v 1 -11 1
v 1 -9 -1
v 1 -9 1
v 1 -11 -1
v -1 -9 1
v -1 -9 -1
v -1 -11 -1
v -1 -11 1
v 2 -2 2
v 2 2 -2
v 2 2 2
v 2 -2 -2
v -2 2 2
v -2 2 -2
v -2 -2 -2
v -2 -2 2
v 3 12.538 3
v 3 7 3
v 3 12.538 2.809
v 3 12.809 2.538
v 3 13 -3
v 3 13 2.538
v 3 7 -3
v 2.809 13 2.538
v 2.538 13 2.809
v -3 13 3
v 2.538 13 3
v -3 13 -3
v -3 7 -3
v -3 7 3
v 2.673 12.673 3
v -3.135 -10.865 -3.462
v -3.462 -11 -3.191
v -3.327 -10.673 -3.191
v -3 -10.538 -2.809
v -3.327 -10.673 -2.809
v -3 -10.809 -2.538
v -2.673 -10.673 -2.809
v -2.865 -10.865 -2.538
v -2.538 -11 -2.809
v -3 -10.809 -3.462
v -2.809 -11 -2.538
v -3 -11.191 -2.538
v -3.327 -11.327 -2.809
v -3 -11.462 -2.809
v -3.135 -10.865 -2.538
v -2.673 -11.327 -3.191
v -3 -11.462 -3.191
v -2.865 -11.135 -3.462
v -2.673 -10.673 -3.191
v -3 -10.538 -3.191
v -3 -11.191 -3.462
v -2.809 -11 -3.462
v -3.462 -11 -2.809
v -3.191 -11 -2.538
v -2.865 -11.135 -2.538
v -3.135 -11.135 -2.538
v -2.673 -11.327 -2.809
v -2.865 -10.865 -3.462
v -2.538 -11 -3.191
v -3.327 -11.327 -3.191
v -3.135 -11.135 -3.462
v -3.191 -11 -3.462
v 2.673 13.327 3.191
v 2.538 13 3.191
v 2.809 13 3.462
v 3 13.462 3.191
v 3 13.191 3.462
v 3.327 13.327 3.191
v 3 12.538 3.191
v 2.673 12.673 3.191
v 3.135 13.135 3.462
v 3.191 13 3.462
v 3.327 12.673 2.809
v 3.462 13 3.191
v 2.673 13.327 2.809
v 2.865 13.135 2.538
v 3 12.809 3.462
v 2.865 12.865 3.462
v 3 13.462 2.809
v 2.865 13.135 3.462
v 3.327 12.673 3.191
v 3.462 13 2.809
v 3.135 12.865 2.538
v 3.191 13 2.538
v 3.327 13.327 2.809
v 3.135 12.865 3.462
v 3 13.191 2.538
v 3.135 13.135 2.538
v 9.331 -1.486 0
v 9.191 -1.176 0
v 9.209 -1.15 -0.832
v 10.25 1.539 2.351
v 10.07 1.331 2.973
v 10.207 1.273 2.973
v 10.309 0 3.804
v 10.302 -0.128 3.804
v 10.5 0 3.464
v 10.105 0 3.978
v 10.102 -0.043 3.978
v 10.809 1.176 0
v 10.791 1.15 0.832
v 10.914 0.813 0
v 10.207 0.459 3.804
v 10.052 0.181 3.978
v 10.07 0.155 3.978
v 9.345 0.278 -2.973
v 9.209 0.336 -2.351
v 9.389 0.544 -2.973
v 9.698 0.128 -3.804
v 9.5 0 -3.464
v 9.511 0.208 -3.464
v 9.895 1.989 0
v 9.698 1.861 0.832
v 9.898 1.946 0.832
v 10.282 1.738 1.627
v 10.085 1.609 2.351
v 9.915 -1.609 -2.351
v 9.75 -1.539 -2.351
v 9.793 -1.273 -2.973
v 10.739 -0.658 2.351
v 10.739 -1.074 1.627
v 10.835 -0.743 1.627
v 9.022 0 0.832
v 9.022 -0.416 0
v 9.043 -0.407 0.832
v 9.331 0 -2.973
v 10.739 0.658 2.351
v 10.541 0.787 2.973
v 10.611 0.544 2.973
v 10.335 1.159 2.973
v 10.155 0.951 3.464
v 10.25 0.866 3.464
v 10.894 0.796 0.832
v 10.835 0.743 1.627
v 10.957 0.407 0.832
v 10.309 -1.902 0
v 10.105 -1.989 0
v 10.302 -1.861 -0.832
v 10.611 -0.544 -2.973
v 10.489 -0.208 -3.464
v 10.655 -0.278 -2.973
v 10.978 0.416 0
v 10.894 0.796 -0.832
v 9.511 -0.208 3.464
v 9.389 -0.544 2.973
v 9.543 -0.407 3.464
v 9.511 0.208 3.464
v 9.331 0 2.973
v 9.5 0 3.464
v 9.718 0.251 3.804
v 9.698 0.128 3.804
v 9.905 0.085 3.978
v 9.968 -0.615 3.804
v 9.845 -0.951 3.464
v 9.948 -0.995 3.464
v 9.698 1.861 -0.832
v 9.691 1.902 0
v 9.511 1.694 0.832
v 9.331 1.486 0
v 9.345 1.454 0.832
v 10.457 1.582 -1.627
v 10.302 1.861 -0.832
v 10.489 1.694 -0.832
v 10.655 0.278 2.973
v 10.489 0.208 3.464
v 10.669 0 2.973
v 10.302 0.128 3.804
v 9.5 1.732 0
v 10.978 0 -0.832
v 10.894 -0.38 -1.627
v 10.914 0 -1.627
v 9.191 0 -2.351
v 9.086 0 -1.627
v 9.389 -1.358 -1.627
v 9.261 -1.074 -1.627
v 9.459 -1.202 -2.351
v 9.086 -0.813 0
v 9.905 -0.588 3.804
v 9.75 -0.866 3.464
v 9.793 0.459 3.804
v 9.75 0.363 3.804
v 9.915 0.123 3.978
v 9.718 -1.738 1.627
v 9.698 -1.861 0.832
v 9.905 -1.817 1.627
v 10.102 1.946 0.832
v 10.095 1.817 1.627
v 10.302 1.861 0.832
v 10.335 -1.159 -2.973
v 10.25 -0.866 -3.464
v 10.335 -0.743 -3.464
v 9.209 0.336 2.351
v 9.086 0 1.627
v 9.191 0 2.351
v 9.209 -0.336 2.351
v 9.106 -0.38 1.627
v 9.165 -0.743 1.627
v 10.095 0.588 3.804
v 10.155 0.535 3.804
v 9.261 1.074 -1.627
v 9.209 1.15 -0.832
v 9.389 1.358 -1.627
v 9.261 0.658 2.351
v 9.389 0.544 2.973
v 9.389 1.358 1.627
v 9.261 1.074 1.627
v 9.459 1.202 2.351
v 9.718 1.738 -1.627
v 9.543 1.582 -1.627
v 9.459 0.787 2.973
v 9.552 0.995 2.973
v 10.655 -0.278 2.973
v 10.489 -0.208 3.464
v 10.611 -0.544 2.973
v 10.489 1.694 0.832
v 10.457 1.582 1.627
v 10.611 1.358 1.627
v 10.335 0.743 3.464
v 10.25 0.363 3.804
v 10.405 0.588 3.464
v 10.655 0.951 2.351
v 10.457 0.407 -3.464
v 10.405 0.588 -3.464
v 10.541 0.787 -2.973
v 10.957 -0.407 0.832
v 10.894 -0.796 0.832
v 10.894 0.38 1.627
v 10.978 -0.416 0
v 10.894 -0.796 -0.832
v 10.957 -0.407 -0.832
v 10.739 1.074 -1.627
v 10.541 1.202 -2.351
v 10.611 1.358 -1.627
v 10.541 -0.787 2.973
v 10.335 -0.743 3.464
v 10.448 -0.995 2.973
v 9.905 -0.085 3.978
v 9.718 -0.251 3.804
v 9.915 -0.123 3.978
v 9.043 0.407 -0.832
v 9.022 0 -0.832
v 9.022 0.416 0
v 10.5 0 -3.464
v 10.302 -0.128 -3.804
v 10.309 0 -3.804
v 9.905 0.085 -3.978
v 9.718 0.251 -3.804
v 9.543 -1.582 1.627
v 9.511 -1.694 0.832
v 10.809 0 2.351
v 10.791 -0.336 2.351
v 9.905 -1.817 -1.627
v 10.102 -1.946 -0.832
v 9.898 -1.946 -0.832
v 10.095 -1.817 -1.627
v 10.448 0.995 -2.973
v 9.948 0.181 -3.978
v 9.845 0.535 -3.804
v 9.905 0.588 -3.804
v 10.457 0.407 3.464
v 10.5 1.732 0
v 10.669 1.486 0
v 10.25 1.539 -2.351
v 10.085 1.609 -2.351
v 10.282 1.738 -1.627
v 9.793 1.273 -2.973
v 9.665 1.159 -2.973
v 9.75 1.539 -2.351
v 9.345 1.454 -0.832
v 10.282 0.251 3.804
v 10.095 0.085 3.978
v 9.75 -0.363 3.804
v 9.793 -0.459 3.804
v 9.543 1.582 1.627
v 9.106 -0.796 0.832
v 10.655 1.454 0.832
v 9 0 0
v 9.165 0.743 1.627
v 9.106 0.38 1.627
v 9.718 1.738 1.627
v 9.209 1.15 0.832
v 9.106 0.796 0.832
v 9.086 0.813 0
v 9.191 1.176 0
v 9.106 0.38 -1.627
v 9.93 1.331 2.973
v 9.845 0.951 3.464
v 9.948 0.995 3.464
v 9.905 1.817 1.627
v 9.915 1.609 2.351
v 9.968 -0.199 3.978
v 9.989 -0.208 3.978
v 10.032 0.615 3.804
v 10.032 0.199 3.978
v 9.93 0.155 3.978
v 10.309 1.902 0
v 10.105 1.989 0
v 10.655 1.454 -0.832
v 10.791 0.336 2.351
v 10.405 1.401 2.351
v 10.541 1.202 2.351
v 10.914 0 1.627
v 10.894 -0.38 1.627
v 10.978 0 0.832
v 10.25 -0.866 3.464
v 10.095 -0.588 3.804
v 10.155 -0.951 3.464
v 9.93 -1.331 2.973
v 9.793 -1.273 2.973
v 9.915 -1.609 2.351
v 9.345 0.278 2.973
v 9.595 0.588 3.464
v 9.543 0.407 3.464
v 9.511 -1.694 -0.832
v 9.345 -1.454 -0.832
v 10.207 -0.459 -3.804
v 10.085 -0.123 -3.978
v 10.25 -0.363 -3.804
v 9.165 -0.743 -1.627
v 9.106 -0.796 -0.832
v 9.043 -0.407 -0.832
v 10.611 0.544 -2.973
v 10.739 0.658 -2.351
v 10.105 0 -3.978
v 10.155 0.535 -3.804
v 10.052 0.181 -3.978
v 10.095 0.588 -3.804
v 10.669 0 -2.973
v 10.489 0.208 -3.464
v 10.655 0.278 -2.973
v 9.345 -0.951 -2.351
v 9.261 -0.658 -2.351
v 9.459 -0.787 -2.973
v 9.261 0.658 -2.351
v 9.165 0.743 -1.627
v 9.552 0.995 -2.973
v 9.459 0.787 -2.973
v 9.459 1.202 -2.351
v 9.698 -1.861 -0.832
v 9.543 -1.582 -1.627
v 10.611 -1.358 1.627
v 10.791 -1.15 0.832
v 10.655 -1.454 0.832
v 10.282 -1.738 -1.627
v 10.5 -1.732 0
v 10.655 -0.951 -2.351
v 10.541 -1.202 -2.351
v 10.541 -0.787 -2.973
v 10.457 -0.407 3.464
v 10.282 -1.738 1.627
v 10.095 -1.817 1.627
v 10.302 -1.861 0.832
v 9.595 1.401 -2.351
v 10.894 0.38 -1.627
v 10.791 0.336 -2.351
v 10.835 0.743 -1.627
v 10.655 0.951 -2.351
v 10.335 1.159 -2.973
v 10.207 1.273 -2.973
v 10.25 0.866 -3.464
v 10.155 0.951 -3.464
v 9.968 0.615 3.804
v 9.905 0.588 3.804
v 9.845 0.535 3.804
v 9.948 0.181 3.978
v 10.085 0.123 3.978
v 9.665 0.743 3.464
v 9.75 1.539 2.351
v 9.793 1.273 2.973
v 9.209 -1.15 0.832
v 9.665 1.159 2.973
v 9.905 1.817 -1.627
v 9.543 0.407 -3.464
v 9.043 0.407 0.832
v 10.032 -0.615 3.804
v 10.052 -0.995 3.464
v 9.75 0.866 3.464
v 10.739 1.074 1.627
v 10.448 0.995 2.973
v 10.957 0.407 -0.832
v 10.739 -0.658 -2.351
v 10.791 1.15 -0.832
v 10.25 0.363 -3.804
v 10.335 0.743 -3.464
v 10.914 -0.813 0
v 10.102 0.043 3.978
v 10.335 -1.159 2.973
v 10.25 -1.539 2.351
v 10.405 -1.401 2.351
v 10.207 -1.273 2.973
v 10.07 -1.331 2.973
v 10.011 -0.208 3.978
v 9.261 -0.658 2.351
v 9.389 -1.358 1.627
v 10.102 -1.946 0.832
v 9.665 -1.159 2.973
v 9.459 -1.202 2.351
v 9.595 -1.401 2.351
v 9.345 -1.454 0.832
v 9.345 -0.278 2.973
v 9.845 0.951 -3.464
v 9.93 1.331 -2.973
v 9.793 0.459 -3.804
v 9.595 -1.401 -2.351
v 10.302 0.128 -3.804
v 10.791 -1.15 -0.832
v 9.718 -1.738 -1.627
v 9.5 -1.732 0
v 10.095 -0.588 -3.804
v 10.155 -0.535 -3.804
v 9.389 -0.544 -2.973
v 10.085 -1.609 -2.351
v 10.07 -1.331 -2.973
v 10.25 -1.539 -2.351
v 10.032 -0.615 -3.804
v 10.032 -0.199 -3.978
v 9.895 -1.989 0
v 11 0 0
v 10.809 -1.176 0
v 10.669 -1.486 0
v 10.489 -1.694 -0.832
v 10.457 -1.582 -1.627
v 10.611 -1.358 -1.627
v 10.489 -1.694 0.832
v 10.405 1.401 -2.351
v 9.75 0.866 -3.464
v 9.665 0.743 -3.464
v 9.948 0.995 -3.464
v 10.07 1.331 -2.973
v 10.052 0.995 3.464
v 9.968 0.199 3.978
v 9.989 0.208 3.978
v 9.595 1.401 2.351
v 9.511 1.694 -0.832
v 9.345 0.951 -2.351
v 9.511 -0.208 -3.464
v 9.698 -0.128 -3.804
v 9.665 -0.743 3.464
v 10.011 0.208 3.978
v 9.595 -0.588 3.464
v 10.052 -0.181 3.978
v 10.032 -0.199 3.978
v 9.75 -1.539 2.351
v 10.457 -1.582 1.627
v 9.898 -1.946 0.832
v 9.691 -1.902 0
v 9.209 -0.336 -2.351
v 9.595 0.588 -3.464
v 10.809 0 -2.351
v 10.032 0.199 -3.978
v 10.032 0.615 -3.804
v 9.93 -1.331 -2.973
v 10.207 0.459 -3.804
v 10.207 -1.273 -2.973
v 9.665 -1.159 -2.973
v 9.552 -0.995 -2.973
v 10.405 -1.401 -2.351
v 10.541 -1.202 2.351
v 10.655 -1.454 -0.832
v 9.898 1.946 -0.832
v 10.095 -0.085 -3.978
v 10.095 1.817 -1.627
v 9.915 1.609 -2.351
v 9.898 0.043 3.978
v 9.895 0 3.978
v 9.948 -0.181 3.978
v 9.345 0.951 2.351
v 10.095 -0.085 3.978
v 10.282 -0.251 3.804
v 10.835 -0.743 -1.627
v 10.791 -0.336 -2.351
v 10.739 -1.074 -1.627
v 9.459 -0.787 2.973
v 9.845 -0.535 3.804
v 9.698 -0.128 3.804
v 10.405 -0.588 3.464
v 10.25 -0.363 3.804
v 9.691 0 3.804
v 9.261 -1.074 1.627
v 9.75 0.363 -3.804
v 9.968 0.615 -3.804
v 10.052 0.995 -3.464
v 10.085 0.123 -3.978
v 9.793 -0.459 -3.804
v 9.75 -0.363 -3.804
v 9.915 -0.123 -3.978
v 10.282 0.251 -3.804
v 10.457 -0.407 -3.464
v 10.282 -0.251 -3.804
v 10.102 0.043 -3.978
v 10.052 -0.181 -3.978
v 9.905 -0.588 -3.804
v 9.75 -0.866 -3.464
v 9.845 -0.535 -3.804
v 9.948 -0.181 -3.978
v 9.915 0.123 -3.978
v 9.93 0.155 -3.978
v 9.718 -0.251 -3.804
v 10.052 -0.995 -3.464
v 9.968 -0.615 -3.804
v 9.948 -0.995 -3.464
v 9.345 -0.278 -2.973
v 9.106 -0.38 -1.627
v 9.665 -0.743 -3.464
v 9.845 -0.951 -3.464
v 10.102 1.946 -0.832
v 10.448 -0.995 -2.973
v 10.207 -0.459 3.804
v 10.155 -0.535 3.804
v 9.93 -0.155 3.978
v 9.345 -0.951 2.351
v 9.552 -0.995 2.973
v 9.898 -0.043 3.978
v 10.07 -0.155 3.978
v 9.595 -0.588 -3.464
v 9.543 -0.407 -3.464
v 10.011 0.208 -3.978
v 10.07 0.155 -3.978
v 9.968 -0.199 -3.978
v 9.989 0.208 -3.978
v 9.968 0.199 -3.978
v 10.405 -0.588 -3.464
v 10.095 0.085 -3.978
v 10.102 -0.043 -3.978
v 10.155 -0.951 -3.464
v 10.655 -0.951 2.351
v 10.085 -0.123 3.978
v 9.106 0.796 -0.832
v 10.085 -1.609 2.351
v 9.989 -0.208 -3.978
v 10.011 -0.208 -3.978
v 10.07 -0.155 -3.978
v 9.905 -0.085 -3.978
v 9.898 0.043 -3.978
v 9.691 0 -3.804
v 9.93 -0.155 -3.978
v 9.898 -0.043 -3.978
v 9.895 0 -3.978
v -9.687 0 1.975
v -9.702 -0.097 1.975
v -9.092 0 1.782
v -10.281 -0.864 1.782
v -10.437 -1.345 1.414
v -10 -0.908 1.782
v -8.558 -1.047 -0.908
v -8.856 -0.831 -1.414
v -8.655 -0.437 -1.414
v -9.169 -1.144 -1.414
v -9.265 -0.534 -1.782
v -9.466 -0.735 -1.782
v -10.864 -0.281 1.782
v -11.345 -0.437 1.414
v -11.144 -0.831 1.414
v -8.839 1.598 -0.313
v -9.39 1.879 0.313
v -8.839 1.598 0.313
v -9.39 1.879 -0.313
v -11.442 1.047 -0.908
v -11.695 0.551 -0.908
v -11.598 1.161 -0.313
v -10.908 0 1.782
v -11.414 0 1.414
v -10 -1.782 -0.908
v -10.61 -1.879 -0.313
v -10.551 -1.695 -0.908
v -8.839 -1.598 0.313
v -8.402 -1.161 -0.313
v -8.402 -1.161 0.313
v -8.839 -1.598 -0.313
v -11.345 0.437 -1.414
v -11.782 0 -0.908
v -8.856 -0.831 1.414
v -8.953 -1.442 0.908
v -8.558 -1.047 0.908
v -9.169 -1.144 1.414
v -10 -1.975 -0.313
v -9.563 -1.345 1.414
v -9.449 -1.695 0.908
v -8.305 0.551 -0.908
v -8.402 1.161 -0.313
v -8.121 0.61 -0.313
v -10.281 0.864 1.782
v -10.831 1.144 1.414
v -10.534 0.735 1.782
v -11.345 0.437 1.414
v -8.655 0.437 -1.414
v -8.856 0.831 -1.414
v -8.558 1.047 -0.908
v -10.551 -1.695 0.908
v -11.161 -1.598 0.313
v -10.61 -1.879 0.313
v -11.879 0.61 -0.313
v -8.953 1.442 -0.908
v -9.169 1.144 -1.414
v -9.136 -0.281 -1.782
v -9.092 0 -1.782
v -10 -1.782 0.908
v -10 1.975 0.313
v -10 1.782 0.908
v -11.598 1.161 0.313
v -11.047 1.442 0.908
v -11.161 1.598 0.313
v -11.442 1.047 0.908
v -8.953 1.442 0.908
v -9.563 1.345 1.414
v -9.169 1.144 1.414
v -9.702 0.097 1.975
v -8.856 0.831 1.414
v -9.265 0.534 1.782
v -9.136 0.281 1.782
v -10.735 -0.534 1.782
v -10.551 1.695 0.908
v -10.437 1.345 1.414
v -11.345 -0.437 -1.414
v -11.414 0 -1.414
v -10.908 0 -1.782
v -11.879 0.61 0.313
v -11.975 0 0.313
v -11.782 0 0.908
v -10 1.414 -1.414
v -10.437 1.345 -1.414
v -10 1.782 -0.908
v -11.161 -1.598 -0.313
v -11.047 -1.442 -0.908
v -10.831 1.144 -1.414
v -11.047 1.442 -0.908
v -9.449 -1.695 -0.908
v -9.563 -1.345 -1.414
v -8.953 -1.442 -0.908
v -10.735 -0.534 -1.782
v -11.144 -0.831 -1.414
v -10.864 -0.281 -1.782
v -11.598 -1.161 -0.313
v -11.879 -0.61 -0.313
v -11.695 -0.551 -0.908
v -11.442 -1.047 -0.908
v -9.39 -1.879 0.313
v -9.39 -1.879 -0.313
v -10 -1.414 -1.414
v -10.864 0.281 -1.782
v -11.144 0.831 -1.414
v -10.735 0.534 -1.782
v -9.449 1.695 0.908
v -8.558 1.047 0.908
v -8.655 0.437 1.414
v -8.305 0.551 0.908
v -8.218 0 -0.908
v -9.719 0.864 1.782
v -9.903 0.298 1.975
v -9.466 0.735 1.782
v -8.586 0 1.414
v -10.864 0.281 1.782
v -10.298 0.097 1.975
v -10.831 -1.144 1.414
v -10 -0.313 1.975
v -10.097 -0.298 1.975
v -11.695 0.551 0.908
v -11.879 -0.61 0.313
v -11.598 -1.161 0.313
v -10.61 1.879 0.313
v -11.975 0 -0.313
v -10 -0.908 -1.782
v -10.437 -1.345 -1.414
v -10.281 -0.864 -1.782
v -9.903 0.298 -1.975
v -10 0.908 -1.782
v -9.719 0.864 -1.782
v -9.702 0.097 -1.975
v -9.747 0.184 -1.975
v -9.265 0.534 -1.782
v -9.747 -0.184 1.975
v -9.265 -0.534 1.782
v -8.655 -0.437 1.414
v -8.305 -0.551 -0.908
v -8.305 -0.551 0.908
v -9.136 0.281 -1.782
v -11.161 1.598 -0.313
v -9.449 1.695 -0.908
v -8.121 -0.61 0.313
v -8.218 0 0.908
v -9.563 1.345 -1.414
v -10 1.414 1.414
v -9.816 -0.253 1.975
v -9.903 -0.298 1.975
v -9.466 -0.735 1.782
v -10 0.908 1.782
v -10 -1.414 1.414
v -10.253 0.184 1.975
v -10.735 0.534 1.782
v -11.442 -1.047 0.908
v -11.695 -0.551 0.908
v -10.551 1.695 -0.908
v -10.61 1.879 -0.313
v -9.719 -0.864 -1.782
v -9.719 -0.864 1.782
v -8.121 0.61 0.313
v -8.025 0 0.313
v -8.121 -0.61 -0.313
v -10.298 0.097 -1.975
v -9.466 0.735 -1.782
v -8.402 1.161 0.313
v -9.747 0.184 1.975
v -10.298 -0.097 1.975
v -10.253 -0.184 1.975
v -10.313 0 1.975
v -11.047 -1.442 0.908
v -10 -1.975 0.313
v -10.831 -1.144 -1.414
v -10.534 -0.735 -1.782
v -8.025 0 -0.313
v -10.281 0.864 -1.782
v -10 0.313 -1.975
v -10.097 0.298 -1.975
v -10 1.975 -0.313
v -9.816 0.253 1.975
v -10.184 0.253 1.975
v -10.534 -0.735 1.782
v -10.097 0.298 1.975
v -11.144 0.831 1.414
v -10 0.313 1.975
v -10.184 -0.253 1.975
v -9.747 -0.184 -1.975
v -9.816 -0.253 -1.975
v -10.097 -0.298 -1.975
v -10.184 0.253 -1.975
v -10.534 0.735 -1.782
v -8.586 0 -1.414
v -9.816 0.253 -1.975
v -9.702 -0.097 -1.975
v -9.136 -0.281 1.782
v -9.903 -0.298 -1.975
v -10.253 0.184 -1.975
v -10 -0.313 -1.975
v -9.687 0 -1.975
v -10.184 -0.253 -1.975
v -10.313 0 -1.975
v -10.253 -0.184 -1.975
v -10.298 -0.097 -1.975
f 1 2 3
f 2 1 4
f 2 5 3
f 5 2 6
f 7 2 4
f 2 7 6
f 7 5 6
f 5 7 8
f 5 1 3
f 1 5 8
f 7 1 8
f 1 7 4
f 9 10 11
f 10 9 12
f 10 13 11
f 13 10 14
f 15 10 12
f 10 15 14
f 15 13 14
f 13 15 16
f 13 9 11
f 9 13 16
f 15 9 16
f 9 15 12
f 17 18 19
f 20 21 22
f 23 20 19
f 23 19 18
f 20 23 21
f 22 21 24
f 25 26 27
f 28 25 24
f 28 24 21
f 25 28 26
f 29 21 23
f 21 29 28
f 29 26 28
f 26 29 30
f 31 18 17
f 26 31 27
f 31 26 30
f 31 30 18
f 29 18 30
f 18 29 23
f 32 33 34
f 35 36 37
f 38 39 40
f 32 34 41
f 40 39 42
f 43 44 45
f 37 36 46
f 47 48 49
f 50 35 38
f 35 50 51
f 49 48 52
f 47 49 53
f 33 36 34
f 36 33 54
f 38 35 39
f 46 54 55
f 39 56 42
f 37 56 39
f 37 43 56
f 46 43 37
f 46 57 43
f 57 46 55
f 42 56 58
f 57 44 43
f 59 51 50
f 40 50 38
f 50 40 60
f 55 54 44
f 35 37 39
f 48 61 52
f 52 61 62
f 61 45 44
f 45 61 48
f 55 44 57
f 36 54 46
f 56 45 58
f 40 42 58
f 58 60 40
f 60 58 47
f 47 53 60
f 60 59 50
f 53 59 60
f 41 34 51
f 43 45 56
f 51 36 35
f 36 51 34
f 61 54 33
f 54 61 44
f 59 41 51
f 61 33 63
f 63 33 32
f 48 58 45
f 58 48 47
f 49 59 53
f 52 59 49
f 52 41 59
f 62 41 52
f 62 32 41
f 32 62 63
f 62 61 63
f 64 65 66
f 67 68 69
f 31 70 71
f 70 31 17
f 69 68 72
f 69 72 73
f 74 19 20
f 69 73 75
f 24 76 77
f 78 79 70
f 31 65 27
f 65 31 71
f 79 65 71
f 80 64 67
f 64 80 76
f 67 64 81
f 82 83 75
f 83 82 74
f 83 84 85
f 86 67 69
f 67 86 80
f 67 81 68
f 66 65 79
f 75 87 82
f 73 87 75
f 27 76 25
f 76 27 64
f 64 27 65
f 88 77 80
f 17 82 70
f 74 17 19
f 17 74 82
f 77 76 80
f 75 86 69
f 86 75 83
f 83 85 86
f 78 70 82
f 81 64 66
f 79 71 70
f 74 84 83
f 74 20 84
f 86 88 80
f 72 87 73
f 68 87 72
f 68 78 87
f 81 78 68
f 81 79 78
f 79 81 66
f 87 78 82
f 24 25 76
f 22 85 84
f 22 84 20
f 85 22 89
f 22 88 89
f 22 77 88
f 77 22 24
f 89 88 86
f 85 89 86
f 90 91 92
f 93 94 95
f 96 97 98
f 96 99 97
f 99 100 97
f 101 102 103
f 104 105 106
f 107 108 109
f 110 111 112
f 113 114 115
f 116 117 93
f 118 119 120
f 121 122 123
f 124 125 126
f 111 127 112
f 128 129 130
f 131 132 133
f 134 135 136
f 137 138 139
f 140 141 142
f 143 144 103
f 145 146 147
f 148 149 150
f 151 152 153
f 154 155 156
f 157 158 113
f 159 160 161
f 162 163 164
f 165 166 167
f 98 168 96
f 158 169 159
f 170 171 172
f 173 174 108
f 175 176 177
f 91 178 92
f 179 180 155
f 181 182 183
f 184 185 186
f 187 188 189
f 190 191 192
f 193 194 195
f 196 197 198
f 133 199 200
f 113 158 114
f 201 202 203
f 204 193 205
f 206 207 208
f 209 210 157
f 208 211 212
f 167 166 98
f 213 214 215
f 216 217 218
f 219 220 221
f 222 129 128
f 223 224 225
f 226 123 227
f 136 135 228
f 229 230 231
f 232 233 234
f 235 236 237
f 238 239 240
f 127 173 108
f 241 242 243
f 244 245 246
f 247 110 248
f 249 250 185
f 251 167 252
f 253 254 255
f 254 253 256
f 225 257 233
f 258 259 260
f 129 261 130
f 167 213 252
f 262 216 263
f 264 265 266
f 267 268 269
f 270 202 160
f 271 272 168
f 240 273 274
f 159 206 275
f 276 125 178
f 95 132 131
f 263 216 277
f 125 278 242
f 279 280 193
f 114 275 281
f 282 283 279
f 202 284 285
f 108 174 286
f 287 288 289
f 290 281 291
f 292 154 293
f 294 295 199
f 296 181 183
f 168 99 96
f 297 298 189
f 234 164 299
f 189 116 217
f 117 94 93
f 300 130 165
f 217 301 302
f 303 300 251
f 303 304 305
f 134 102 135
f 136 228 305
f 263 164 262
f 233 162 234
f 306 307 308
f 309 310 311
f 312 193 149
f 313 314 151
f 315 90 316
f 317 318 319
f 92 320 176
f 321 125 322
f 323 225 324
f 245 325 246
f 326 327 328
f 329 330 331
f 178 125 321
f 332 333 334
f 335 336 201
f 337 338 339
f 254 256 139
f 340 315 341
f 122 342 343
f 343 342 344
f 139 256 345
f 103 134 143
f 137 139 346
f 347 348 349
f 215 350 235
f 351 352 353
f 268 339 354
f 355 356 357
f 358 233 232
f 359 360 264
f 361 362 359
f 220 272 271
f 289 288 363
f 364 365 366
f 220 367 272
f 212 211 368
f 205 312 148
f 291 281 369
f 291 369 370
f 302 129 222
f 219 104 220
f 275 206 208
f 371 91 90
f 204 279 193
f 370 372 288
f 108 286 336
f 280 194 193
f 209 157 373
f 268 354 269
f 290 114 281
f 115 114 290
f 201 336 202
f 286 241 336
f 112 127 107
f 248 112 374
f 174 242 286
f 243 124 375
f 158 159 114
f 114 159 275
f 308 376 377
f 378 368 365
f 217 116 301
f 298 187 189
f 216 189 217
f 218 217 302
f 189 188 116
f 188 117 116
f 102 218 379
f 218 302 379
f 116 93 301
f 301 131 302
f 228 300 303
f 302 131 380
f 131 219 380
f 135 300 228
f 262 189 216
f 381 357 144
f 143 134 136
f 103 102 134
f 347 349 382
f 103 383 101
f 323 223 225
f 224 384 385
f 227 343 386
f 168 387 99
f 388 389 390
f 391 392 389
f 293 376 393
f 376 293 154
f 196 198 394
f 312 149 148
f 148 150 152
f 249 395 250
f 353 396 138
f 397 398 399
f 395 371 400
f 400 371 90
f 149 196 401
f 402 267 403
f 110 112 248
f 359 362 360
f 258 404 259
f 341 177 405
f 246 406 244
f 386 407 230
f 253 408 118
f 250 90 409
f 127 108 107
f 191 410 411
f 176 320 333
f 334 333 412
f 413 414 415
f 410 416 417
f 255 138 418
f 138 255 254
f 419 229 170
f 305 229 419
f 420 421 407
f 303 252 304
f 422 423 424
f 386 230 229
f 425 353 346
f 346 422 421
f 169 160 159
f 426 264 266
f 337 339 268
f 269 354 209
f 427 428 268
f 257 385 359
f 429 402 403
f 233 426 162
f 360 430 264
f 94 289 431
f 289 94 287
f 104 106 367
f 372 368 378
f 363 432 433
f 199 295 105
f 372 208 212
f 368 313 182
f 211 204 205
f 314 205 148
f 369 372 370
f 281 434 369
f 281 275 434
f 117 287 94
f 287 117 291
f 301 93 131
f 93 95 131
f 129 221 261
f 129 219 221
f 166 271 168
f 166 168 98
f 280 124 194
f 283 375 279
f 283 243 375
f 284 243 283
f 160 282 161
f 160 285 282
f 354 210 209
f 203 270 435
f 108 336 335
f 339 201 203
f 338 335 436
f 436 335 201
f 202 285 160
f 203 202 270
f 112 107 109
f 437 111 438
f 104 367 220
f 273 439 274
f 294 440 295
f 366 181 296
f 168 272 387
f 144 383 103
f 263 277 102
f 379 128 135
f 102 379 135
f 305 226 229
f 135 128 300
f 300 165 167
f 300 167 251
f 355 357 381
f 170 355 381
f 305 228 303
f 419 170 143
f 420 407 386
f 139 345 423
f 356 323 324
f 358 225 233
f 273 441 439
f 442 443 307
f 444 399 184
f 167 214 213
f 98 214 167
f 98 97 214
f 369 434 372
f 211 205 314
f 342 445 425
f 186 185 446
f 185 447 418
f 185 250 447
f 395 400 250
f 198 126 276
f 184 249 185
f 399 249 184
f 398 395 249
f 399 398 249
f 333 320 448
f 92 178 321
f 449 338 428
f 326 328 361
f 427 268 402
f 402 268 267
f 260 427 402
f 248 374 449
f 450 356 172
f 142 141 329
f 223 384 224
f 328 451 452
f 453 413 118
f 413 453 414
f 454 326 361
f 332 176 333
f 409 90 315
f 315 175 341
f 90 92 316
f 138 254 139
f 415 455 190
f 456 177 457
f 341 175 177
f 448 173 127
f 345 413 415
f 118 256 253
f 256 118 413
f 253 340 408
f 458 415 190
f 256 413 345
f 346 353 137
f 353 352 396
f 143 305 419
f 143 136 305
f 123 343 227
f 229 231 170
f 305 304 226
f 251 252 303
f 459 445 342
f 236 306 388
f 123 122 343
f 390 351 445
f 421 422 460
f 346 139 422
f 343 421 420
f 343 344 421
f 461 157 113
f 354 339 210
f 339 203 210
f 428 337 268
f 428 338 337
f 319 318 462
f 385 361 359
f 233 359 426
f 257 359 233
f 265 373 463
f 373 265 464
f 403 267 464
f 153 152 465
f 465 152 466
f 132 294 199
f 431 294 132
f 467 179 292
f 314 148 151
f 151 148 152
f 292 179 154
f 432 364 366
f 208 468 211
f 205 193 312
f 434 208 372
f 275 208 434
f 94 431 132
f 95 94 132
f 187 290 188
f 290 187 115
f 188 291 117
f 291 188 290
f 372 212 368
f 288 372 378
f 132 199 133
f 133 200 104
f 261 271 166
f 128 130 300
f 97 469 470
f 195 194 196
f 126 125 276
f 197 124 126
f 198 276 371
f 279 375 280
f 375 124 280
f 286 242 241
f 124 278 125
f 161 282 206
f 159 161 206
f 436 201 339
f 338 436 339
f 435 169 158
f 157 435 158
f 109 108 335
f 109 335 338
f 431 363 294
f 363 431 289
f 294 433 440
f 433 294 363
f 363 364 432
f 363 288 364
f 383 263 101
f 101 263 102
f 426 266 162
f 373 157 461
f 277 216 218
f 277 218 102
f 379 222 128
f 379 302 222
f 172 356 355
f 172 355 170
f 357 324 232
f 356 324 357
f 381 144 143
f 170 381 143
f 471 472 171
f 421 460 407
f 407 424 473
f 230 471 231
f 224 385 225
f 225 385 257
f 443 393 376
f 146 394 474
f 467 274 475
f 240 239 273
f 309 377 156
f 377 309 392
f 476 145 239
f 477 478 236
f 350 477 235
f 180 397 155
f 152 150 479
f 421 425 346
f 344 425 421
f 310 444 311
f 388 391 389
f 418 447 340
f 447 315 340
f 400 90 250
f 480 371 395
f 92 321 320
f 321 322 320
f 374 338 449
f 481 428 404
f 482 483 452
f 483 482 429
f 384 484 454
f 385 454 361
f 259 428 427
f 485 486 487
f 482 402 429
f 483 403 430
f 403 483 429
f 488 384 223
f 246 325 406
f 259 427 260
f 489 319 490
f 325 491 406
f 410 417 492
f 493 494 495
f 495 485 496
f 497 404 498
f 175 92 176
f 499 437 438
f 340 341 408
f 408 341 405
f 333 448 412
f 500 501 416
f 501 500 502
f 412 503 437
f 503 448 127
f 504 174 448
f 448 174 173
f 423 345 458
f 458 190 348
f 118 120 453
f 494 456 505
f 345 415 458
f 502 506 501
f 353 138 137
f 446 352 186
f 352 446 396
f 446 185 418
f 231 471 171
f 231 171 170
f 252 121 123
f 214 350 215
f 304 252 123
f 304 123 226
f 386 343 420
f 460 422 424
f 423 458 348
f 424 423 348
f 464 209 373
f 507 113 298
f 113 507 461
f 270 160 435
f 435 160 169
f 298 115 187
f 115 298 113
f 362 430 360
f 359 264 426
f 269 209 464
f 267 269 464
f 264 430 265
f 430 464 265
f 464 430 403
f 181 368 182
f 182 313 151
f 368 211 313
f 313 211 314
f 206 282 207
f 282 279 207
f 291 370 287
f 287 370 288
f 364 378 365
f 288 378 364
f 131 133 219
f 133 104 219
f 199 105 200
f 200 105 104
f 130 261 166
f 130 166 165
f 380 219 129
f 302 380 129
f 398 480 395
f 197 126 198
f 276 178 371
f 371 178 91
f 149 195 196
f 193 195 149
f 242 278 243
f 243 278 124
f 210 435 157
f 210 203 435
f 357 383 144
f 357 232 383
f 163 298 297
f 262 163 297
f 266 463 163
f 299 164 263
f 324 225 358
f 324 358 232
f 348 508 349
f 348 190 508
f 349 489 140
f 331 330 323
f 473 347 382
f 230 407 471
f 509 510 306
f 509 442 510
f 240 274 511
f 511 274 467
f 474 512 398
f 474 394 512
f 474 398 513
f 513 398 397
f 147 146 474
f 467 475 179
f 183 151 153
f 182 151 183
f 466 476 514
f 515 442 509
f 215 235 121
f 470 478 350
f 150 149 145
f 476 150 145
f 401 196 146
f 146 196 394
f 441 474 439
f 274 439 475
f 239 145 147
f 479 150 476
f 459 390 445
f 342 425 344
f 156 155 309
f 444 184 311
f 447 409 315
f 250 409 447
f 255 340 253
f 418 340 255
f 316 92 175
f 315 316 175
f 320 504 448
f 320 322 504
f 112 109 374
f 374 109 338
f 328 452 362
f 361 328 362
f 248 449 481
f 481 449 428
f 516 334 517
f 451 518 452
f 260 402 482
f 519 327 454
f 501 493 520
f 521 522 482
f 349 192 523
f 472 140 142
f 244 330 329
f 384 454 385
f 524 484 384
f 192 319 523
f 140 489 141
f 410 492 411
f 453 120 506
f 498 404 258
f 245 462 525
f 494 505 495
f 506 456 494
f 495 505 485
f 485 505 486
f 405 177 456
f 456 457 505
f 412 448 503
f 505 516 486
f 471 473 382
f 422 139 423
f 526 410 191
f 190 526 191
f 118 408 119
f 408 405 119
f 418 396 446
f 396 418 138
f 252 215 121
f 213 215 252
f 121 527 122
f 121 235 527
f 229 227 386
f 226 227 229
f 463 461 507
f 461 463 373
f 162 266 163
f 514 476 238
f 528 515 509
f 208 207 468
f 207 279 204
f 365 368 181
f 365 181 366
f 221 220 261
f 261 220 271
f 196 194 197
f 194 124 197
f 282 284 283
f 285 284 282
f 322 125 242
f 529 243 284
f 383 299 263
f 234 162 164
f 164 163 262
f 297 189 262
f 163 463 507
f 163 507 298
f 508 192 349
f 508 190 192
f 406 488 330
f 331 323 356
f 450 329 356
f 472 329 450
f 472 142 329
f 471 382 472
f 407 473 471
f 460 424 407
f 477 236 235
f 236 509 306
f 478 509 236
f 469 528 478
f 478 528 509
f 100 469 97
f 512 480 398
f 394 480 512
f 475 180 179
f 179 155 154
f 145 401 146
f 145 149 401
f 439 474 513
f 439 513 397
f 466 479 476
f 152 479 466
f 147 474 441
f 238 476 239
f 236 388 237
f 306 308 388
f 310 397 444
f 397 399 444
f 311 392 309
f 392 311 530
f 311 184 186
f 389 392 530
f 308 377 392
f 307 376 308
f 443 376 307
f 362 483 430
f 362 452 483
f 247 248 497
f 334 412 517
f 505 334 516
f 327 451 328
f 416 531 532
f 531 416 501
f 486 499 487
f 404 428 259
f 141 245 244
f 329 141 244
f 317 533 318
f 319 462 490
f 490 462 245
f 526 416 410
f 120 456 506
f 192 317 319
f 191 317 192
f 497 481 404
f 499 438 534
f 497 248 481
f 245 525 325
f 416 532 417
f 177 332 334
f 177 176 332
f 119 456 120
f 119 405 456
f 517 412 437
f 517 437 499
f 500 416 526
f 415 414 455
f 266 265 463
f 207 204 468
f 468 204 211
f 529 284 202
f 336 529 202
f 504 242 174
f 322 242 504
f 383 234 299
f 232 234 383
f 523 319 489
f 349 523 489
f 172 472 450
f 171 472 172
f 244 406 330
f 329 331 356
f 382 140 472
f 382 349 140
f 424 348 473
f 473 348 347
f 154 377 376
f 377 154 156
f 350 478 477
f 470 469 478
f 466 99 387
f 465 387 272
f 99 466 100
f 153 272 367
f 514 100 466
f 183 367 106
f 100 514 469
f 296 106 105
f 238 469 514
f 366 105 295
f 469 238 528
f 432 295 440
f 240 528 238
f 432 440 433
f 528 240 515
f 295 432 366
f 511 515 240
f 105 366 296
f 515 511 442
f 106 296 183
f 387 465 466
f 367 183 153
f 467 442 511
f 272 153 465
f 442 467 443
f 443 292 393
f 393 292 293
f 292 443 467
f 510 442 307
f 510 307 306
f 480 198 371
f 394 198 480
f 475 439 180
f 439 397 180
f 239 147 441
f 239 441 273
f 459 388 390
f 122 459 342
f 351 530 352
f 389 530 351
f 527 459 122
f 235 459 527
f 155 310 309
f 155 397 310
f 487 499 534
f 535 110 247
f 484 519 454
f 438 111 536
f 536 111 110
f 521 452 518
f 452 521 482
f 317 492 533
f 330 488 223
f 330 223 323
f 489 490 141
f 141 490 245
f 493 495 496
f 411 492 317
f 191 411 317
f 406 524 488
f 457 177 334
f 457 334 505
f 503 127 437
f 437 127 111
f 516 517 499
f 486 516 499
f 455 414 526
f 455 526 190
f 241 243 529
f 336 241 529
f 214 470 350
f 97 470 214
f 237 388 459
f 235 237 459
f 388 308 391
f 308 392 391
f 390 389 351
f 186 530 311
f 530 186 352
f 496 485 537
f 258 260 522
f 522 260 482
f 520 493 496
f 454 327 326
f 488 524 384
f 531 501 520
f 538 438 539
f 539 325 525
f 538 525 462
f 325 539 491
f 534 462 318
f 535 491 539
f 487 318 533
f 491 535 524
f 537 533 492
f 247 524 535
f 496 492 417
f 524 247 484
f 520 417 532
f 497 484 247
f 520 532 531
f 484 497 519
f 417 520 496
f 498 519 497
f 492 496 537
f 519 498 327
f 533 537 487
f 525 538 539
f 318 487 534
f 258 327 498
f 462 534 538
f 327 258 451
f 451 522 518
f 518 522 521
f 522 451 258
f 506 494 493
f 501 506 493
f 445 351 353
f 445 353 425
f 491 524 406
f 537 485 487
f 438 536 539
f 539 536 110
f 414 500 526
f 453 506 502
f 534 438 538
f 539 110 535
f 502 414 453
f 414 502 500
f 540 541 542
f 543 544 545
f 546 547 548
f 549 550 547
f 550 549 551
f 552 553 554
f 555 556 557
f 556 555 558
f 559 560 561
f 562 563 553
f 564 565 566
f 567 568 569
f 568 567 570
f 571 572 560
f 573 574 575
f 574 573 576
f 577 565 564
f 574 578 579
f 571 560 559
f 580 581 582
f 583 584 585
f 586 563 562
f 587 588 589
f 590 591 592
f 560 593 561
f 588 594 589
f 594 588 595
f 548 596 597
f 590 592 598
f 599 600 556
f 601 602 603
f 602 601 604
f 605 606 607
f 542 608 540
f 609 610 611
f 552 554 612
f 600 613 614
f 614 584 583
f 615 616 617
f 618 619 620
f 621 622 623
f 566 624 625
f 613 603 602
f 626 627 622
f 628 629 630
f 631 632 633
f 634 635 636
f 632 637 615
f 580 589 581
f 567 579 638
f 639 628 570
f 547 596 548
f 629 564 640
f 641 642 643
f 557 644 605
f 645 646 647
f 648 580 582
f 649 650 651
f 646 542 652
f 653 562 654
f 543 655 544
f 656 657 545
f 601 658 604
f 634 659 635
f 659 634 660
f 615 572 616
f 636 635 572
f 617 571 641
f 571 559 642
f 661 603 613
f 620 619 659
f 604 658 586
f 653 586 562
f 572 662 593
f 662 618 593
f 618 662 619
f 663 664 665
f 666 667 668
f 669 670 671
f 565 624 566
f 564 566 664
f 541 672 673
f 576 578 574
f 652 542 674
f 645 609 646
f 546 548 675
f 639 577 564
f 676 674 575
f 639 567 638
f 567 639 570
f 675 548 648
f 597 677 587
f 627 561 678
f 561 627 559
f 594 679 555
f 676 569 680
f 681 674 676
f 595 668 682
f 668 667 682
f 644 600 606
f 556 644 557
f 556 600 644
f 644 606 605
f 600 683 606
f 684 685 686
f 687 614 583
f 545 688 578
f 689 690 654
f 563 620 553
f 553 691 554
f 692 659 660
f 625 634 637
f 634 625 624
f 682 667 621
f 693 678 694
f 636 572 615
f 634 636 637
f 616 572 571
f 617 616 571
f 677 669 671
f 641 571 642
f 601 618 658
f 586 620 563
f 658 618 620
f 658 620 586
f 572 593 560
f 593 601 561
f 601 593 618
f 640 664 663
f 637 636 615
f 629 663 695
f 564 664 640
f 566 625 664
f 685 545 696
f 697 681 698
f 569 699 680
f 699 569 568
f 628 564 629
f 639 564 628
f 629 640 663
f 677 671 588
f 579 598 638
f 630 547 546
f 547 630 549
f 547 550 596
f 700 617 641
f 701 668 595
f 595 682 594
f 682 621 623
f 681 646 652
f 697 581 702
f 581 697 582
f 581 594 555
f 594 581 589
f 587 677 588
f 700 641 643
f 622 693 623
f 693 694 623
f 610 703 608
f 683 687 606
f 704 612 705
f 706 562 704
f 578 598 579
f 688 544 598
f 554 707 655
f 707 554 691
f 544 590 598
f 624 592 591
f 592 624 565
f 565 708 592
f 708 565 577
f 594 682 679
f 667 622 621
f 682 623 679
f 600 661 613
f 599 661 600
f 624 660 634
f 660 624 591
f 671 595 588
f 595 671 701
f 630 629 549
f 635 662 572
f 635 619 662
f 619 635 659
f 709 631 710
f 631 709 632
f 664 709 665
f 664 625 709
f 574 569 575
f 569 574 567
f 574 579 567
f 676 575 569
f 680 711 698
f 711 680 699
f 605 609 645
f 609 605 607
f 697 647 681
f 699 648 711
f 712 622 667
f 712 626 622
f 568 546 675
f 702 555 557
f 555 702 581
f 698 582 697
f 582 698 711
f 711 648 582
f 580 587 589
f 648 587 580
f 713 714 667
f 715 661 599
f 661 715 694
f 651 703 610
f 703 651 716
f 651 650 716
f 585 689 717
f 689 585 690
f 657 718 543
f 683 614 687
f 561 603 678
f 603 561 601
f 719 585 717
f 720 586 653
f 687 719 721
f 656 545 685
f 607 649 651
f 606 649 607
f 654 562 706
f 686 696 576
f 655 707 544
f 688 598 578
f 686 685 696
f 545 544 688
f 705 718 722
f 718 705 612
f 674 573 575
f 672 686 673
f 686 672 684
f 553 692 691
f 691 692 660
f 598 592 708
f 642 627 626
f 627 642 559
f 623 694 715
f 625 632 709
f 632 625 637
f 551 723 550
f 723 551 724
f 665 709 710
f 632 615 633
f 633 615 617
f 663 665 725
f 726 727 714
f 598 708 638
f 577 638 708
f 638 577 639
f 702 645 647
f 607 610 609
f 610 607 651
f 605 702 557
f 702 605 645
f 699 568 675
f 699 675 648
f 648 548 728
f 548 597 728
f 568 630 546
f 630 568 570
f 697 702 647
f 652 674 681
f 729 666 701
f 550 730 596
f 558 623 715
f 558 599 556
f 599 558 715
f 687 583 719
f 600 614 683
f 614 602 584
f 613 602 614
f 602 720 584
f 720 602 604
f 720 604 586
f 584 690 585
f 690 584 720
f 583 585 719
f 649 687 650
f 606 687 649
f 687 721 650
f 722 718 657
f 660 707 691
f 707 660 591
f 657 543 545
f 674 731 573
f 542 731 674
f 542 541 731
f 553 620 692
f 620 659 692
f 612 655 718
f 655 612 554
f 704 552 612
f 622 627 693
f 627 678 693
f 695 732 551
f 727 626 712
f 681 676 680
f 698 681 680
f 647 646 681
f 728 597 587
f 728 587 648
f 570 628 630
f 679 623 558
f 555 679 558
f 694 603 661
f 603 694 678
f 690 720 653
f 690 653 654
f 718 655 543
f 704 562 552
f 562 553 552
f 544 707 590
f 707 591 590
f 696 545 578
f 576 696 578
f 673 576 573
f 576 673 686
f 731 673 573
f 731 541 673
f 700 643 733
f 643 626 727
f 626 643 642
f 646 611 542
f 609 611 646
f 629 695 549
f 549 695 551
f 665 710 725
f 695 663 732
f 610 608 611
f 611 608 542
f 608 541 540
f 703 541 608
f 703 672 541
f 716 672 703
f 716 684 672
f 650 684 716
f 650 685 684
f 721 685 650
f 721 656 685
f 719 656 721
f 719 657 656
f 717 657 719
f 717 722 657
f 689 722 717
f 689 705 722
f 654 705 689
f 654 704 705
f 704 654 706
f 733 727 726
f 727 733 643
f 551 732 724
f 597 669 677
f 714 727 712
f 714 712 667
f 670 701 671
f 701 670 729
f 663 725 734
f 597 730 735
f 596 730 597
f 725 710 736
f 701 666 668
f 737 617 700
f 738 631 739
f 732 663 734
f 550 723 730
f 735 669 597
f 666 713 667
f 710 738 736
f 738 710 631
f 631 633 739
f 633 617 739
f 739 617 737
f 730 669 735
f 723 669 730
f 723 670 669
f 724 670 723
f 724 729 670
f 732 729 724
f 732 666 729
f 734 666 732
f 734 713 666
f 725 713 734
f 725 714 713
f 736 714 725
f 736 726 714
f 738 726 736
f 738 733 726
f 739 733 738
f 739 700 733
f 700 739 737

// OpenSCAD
// "Functional OpenSCAD" library by Hans Loeblich
// 
// https://github.com/thehans/FunctionalOpenSCAD
//
// This library is an attempt to re-implement OpenSCAD's builtin modules 
// as functions which operate directly on vertex data.
// 
// Having access to vertex, path, and face geometry data makes it possible
// to extend the functionality of OpenSCAD from within a user script
//    For example, this library includes function bounds(poly) which returns [[minX,minY,minZ],[maxX,maxY,maxZ]]
//    representing the max and min coordinates of all points that make up a shape or list of shapes
//    This sort of calculation is not possible when using builtin modules because their vertex data is not accessible 

functional_examples();

// Some basic examples of how library functions can be used
module functional_examples() {

  // multiple nested function calls, with the results of a function passed as poly parameter for another
  color("yellow") poly3d(
    translate([10,0,0], 
      poly=scale([1,2,4], 
        poly=sphere(1,$fn=30)
      )
    ) 
  );  
  
  // assigning to intermediate variables
  shape = sphere(d=4,$fn=20);
  moved_shape = translate([-10,0,0], poly=shape);
  color("blue") poly3d(moved_shape);  

  // make a vector containing multiple shapes
  shape_vector = [ for (i = [-1:1]) translate([0,i*10,0], poly=cube(i*2+4,center=true)) ];
  color("green") poly3d(shape_vector);
  b = bounds(shape_vector);
  // output bounds data to console
  echo(b);
  
  // display corner points of bounding volume
  color("red") showPoints(b, r=0.5, $fn=20);
}


// The functions in this library have the same names as the builtin modules, 
// but that doesn't mean they are overriden.  The OpenSCAD language distinguishes between 
// function calls and module calls based on syntax and context
// Functions always return a result:
//    poly = square([1,2]);   // the result must be either assigned to a variable, or...
//    poly2d(square([1,2]));  // passed directly(or as part of an expression) as a parameter to a module or function
//    in these contexts square is expected to return a value, so OpenSCAD knows to call the square function from our library
// Modules can't be passed as parameters, and can't be assigned to variables.  Module calls are valid statements by themselves
//    square();
//    since its not being stored in a variable or passed as parameter, OpenSCAD knows to call builtin square module

// Functions for primitives return shapes in the form of nested vectors
// 2d shapes are represented by a vector with two elements: poly=[points, paths] 
//    points and paths are the same format as used by "polygon"
//    (see https://en.wikibooks.org/wiki/OpenSCAD_User_Manual/The_OpenSCAD_Language#polygon )
// 3d shapes take the form: poly=[points, faces] 
//    points, faces are the same format as used by "polyhedron"
//    (see https://en.wikibooks.org/wiki/OpenSCAD_User_Manual/The_OpenSCAD_Language#polyhedron )

// Most functions also accept vectors of those 2d and 3d shapes 
//    poly = [ [points, faces], [points2,faces2], ...]
//    poly = [ [points, paths], [points2,paths2], ...]
// or plain poly=points  (often for representing a path or part of one)

// Library API Reference

// Function listed here copy the behavior of a builtin module
//  2D Primitives
//    square(size=1, center=false,r=0)
//    circle(r=1, c=[0,0], internal=false, d)
//  3D Primitives
//    cube(size=1, center=false)
//    sphere(r=1, d)
//    cylinder(h=1,r1,r2,center=false,r,d,d1,d2)
//  2D to 3D
//    linear_extrude(height=100, center=false, convexity=1, twist=0, slices, scale=1.0, poly)
//    rotate_extrude(angle=360, offsetAngle=0, center=false, v_offset=0, i_offset=0, poly)
//  Transforms
//    scale(v, poly)
//    resize(newsize,poly) 
//    rotate(a, v, poly)
//    translate(v, poly)
//    mirror(normal, poly) 
//    multmatrix(M, poly)

//  Extra Functions
//    arc(r=1, angle=360, offsetAngle=0, c=[0,0], center=false, internal=false)
//    bounds(poly)
//    invert(poly)
//    signed_area(points)

//  Additonal Modules 
//    poly3d(poly)
//    poly2d(poly)
//    showPoints(points, r=0.1)

// Functions by themselves will never create a geometry that OpenSCAD would display, they can only return values.
// To display our shapes, we must call polygon or polyhedron on the results of our functions.

// poly2d(poly) and poly3d(poly) act as shortcuts for calling polygon and polyhedron 

// OpenSCAD Modules not (yet) implemented as Functions
//  3D to 2D
//    projection
//  Transform
//    offset
//    minkowski
//    hull
//  Booleans
//    union
//    difference
//    intersection

// TODO support multiple paths for polygons in linear_extrude and rotate_extrude
// TODO rename "poly" parameters to "shape" or "geometry"?


// basic utility functions
function is_array(a) = len(a) != undef;
function unit(v) = v / norm(v); // convert vector to unit vector
function flatten(l) = [ for (a = l) for (b = a) b ];
function reverse(v) = [ for (i = [0:len(v)-1])  v[len(v) -1 - i] ];
// integer based range, inclusive
function irange(a,b) = let (step = a > b ? -1 : 1) [ for (i = [a:step:b]) i ];
function sum(v, i=0) = len(v) > i ? v[i] + sum(v, i+1) : 0;
// depth of first elements, not necessarily max depth of a structure
function depth(a,n=0) = len(a) == undef ? n : depth(a[0],n+1);
function default(x,default) = x == undef ? default : x;
// "polyhole" conversion, typically for internal holes
function to_internal(r_in, r_max) = r_in / cos (180 / fragments(r_max == undef ? r_in : r_max));
// angle between two vectors (2D or 3D)
function anglev(v1,v2) = acos( (v1*v2) / (norm(v1)*norm(v2) ) );

function sinh(x) = (1 - exp( -2 * x) )/ (2 * exp(-x));
function cosh(x) = (1 + exp( -2 * x)) / (2 * exp(-x));
function tanh(x) = sinh(x) / cosh(x);
function cot(x) = 1 / tan(x);
function mod(a,m) = a - m*floor(a/m);

// Helper functions mainly used within other functions:

// based on get_fragments_from_r documented on wiki
// https://en.wikibooks.org/wiki/OpenSCAD_User_Manual/The_OpenSCAD_Language
function fragments(r=1) = ($fn > 0) ? 
  ($fn >= 3 ? $fn : 3) : 
  ceil(max(min(360.0 / $fa, r*2*PI / $fs), 5));

// Calculate fragments for a linear dimension.
// (don't factor in radius-based calculations)
function linear_fragments(l=1) = ($fn > 0) ? 
  ($fn >= 3 ? $fn : 3) : 
  ceil(max(l / $fs),5);

// Generate a list of points for a circular arc with center c, radius r, etc.
// "center" parameter centers the sweep of the arc about the offsetAngle (half to each side of it)
// "internal" parameter enables polyhole radius correction
// optional "d" parameter overrides r
// optional "fragments" parameter overrides calculations from $fn,$fs,$fa with a direct input
// optional "endpoint" parameter specifies whether or not to include the last point in the arc, 
//    by default the endpoint is included as long as the angle is not 360
//    setting endpoint=false can be useful to avoid duplicating points if you are concatenating arc paths together
function arc(r=1, angle=360, offsetAngle=0, c=[0,0], center=false, internal=false, d, fragments, endpoint) = 
  let (
    r1 = d==undef ? r : d/2,
    fragments = fragments==undef ? ceil((abs(angle) / 360) * fragments(r1,$fn)) : fragments,
    step = angle / fragments,
    a = offsetAngle-(center ? angle/2 : 0),
    R = internal ? to_internal(r1) : r1,
    last = endpoint==undef ? (abs(angle) == 360 ? 1 : 0) : (endpoint ? 0 : 1)
  )
  [ for (i = [0:fragments-last] ) let(a2=i*step+a) c+R*[cos(a2), sin(a2)] ];

// **2D Primitives**
function square(size=1, center=false,r=0) =
  let(
    x = len(size) ? size.x : size, 
    y = len(size) ? size.y : size,
    o = center ? [-x/2,-y/2] : [0,0],
    d = r*2
  )
  //assert(d <= x && d <= y)
  translate(o, 
    (r > 0 ? 
      concat(
        arc(r=r, angle=-90, offsetAngle=0,   c=[x-r,  r]), 
        arc(r=r, angle=-90, offsetAngle=270, c=[  r,  r]), 
        arc(r=r, angle=-90, offsetAngle=180, c=[  r,y-r]), 
        arc(r=r, angle=-90, offsetAngle=90,  c=[x-r,y-r])
      ) :
      [[[0,0],[0,y],[x,y],[x,0]],[[0,1,2,3]]]
    )
  );

function circle(r=1, c=[0,0], internal=false, offsetAngle=0, d) = 
  let(
    r1 = d==undef ? r : d/2,
    points = arc(r=r1,c=c,angle=-360,offsetAngle=offsetAngle,internal=internal)
  )
  [points,[irange(0,len(points)-1)]];


// **3D Primitives**
function cube(size=1, center=false) = 
  let(
    s = is_array(size) ? size : [size,size,size],
    points = [
      [0,0,0],[s.x,0,0],[0,s.y,0],[s.x,s.y,0],
      [0,0,s.z],[s.x,0,s.z],[0,s.y,s.z],[s.x,s.y,s.z]],
    faces = [[3,1,5,7],[0,1,3,2],[1,0,4,5],[2,3,7,6],[0,2,6,4],[5,4,6,7]],
    c = is_array(center) ? [center.x ? s.x : 0, center.y ? s.y : 0, center.z ? s.z : 0]/2 : s/2 
  )
  center ? [translate(-c,points),faces] : [points,faces];

function sphere(r=1, d) = 
  let(
    R = d == undef ? r : d/2,
    fragments = fragments(R),
    rings = floor((fragments+1)/2),
    c1 = get_points(circle(r=R)),
    points = flatten([for (i = [0:rings-1])
      let(angle =  (180 * (i + 0.5)) / rings)
      translate([0,0,R*cos(angle)], poly=sin(angle)*c1) 
    ]),
    lp = len(points),
    faces = concat(
      flatten([
        for (i = [0:rings-2], j = [0:fragments-1])
          let (
            il = i * fragments,
            il1 = il + fragments,
            j1 = (j == fragments-1) ? 0 : j+1,
            i0 = il + j, 
            i1 = il + j1, 
            i2 = il1 + j, 
            i3 = il1 + j1
          )
          [[i0,i2,i1],[i1,i2,i3]]
      ]),
      [irange(0,fragments-1)], // top ring face
      [irange(lp-1,lp-fragments)] // bottom ring face
    )
  )
  [points,faces];

// cylinder
function cylinder(h=1,r1,r2,center=false,r,d,d1,d2) = 
  let(
    R1 = (d1 == undef ? (d == undef ? (r1 == undef ? (r == undef ? 1 : r) : r1) : d/2) : d1/2),
    R2 = (d2 == undef ? (d == undef ? (r2 == undef ? (r == undef ? 1 : r) : r2) : d/2) : d2/2),
    scale = R2/R1
  )
  linear_extrude(height=h, scale=scale, center=center, poly=circle(r=R1));



// **3D to 2D**
// TODO projection



// **2D to 3D**
function linear_extrude(height=100, center=false, convexity=1, twist=0, slices, scale=1.0, poly) = 
  is_poly_vector(poly) ? 
    [for (p = poly) _linear_extrude(height=height,center=center,convexity=convexity,twist=twist,slices=slices,scale=scale,poly=poly)] :
    _linear_extrude(height=height,center=center,convexity=convexity,twist=twist,slices=slices,scale=scale,poly=poly);

function _linear_extrude(height, center, convexity, twist, slices, scale, poly) = 
  let(
    points = get_points(poly),
    sl = slices == undef ? (twist == 0 ? 1 : 7) : slices,
    hstep = height/sl,
    astep = -twist/sl,
    sstep = (scale-1)/sl,
    hoffset = center ? -height/2 : 0,
    newPoints = flatten([for (i = [0:sl]) 
      rotate(a=astep*i, poly=
        translate([0,0,hstep*i+hoffset], poly=
          scale(1+sstep*i, poly=
            points
          )
        )
      )
    ]),
    l = len(points),
    lp = len(newPoints),
    faces = concat(
      flatten(
        [for (i = [0:sl-1], j = [0:l-1] )
          let(
            il = i*l,
            j1 = j + 1 == l ? 0 : j+1,
            i0 = il + j,
            i1 = il + j1,
            i2 = il+l + j,
            i3 = il+l + j1
          )
          [[i0,i1,i3],[i0,i3,i2]]
        ]),
        [irange(l-1,0),irange(lp-l,lp-1)]
    )
  )
  [newPoints, faces];


// generate points/paths for a polyhedron, given a vector of 2d point data
function rotate_extrude(angle=360, offsetAngle=0, center=false, v_offset=0, i_offset=0, poly) = 
  let(
    points = get_points(poly),
    a = ((angle != angle/*nan check*/ || angle==undef || angle > 360) ? 360 :
      (angle <= -360 ? 360 : angle)
    ),
    full_rev = a==360 ? 1 : 0,
    l = len(points),
    xs = [for (p = points) p.x],
    min_x = min(xs),
    max_x = max(xs),
    fragments = ceil((abs(a) / 360) * fragments(max_x,$fn)),
    steps = fragments - full_rev,
    step = a / fragments,
    a1 = offsetAngle-(center ? a/2 : 0),
    ps = rotate(a=[90,0,0],poly=signed_area(points) < 0 ? reverse(points) : points),
    out_points = flatten([ 
      for (i = [0:steps] ) 
        let(a2=i*step+a1,h=v_offset*i/(fragments)) 
        translate([0,0,h], poly=rotate(a2, poly=ps))
    ]),
    lp = len(out_points),
    out_paths = flatten([
      for (i = [0:fragments-1], j = [0:l-1])
        let(
          il = i*l,
          il1 = (i == steps) ? 0 : (i+1)*l,
          j1 = (j == l-1) ? 0 : j+1,
          a=il+j,
          b=il+j1,
          c=il1+j,
          d=il1+j1,
          ax=ps[j].x,
          bx=ps[j1].x
        )
        ax == 0 ? // ax == cx == 0 
          (bx == 0 ? 
            [] : // zero area tri
            [[c,b,d]] // triangle fan
          ) :
          (bx == 0 ? // bx == dx == 0
            [[a,b,c]] : // triangle fan
            [[a,b,c], [c,b,d]] // full quad
          )
    ]),
    faces = full_rev ? 
      out_paths : 
      concat(out_paths, [irange(l-1,0),irange(lp-l,lp-1)]) // include end caps
  )
  //assert(min_x >= 0)
  [out_points, faces];


// **Transform**

// get/set point array from 3 possible input types: 
//    poly=[points, faces] (as used by polyhedron), 
//    poly=[points, paths] (as used by polygon), 
// or poly=points (used by polygon or for intermediate point data processing)
function get_points(poly) = depth(poly) <= 2 ? poly : poly[0];
function set_points(poly, points) = depth(poly) <= 2 ? points : [points,poly[1]];

function is_poly_vector(poly) = depth(poly) > 3;
function is_3d_poly(poly) = is_poly_vector(poly) ?
  len(get_points(poly[0])[0]) == 3 : 
  len(get_points(poly)[0]) == 3;
  
// scale
function scale(v=1, poly) = is_poly_vector(poly) ? 
  [for (p=poly) _scale(v=v,poly=p)] :
  _scale(v=v,poly=poly);

// scale for single poly, no vectors of polys
function _scale(v, poly) = 
  let(
    points = get_points(poly),
    s = len(v) ? v : [v,v,v],
    newPoints = len(points[0]) == 3 ? 
      [for (p = points) [s.x*p.x,s.y*p.y,s.z*p.z]] : 
      [for (p = points) [s.x*p.x,s.y*p.y]]
  )
  set_points(poly, newPoints);


// resize
function resize(newsize,poly) = 
  let(
    b = bounds(poly),
    minB = b[0],
    maxB = b[1],
    sX = newsize.x ? newsize.x/(maxB.x-minB.x) : 1,
    sY = newsize.y ? newsize.y/(maxB.y-minB.y) : 1,
    v1 = len(minB) == 3 ? 
      [sX, sY, newsize.z ? newsize.z/(maxB.z-minB.z) : 1] :
      [sX, sY]
  )
  scale(v1,poly);

function rotate(a=0, v, poly) = is_poly_vector(poly) ? 
  [for (p=poly) _rotate(a=a,v=v,poly=p)] :
  _rotate(a=a,v=v,poly=poly);

function _rotate(a, v, poly) = 
  let(
    points = get_points(poly),
    newPoints = is_3d_poly(points) || len(a) == 3 ? 
      _rotate3d(a=a,v=v,points=points) : 
      _rotate2d(a=a,points=points)
  )
  set_points(poly, newPoints);

function _rotate3d(a,v,points) = 
  let(A = is_array(a) ? to3d(a) : [0,0,a])
  (!is_array(a) && is_array(v)) ?
    _rotate3d_v(a,unit(to3d(v)),points) :
    _rotate3d_xyz(A,points);

// rotate a list of 3d points by angle vector a
// a = [pitch,roll,yaw] in degrees
function _rotate3d_xyz(a, points) = 
  let(
    cosa = cos(a.z), sina = sin(a.z),
    cosb = cos(a.y), sinb = sin(a.y),
    cosc = cos(a.x), sinc = sin(a.x),
    Axx = cosa*cosb,
    Axy = cosa*sinb*sinc - sina*cosc,
    Axz = cosa*sinb*cosc + sina*sinc,
    Ayx = sina*cosb,
    Ayy = sina*sinb*sinc + cosa*cosc,
    Ayz = sina*sinb*cosc - cosa*sinc,
    Azx = -sinb,
    Azy = cosb*sinc,
    Azz = cosb*cosc
  )
  [for (p = points)
    let( pz = (p.z == undef) ? 0 : p.z )
    [Axx*p.x + Axy*p.y + Axz*pz, 
     Ayx*p.x + Ayy*p.y + Ayz*pz, 
     Azx*p.x + Azy*p.y + Azz*pz] ];

function _rotate3d_v(a, v, points) = 
  let(
    cosa = cos(a), sina = sin(a)
  )
  [for (p = points)
    let( P=to3d(p) )
    P*cosa+(cross(v,P))*sina+v*(v*P)*(1-cosa) // Rodrigues' rotation formula
  ];

// rotate about z axis without adding 3rd dimension to points
function _rotate2d(a, points) = 
  let(cosa = cos(a), sina = sin(a))
  [for (p = points) [p.x * cosa - p.y * sina,p.x * sina + p.y * cosa]];

function translate(v, poly) = is_poly_vector(poly) ? 
  [for (p=poly) _translate(v=v, poly=p)] :
  _translate(v=v, poly=poly);

function _translate(v, poly) = 
  let(
    points = get_points(poly),
    lp = len(points[0]), // 2d or 3d point data?
    lv = len(v),         // 2d or 3d translation vector?
    V = lp > lv ? [v.x,v.y,0] : v, // allow adding a 2d vector to 3d points
    newPoints = (lv > lp) ?
        [for (p = points) [p.x,p.y,0]+V] : // allow adding a 3d vector to 2d point data
        [for (p = points) p+V] // allow adding 2d or 3d vectors 
  )
  set_points(poly, newPoints);

function mirror(normal, poly) = is_poly_vector(poly) ? 
  [for (p=poly) _mirror(normal=normal, poly=p)] :
  _mirror(normal=normal, poly=poly);
        
function _mirror(normal=[1,0], poly) = 
  let(
    points = get_points(poly),
    newPoints = [for (p = points)
      let(
        n = normal*normal, 
        t = n == 0 ? 0 : (-p*normal) / n
      )
      p + 2*t*normal
    ]
  )
  set_points(poly, newPoints);

function multmatrix(M, poly) = is_poly_vector(poly) ?
  [for (p = poly) _multmatrix(M=M,poly=p)] :
  _multmatrix(M=M,poly=poly);

function _multmatrix(M, poly) = 
  let(
    points = get_points(poly),
    newPoints = is_3d_poly(poly) ? 
      [for (p = points) to3d(M*[p.x,p.y,p.z,1])] : 
      [for (p = points) to2d(M*[p.x,p.y,0,1])]
  )
  set_points(poly, newPoints);


function bounds(poly) = is_3d_poly(poly) ?
  (is_poly_vector(poly) ?
    _bounds_multi_3d(poly) :
    _bounds_3d(poly)) :
  (is_poly_vector(poly) ? 
    _bounds_multi_2d(poly) :
    _bounds_2d(poly));

function _bounds_2d(poly) = 
    let(
      points = get_points(poly),
      minX = min([for (p = points) p.x]),
      maxX = max([for (p = points) p.x]),
      minY = min([for (p = points) p.y]),
      maxY = max([for (p = points) p.y])
    )
    [[minX,minY],[maxX,maxY]];

function _bounds_3d(poly) = 
    let(
      points = get_points(poly),
      minX = min([for (p = points) p.x]),
      maxX = max([for (p = points) p.x]),
      minY = min([for (p = points) p.y]),
      maxY = max([for (p = points) p.y]),
      minZ = min([for (p = points) p.z]),
      maxZ = max([for (p = points) p.z])
    )
    [[minX,minY,minZ],[maxX,maxY,maxZ]];

function _bounds_multi_2d(polys) = 
    let(
      minX = min([for (poly=polys, p = get_points(poly)) p.x]),
      maxX = max([for (poly=polys, p = get_points(poly)) p.x]),
      minY = min([for (poly=polys, p = get_points(poly)) p.y]),
      maxY = max([for (poly=polys, p = get_points(poly)) p.y])
    )
    [[minX,minY],[maxX,maxY]];

function _bounds_multi_3d(polys) = 
    let(
      minX = min([for (poly=polys, p = get_points(poly)) p.x]),
      maxX = max([for (poly=polys, p = get_points(poly)) p.x]),
      minY = min([for (poly=polys, p = get_points(poly)) p.y]),
      maxY = max([for (poly=polys, p = get_points(poly)) p.y]),
      minZ = min([for (poly=polys, p = get_points(poly)) p.z]),
      maxZ = max([for (poly=polys, p = get_points(poly)) p.z])
    )
    [[minX,minY,minZ],[maxX,maxY,maxZ]];

// reverse direction of all faces in polyhedron.
function invert(poly) = 
  let(faces = poly[1])    
  [ poly[0], [for (face = faces) reverse(face)] ];

function to3d(p) = let(l = len(p)) (l>2 ? [p.x,p.y,p.z] : (l>1 ? [p.x,p.y,0]:(l>0 ? [p.x,0,0] : [0,0,0])));
function to2d(p) = let(l = len(p)) (l>1 ? [p.x,p.y]:(l>0 ? [p.x,0] : [0,0]));

// shoelace formula, returns negative value for clockwise wound polygons
function signed_area(points) =
  let( l = len(points) )
  sum([
    for (i = [0:l-1]) 
      let(
        p_i = points[i], 
        i1 = i+1, 
        p_i1 = points[i1 >= l ? i1-l : i1]
      )
      p_i.x * p_i1.y - p_i1.x * p_i.y
  ])/2;


/* Visualizations */

// visualize a vector of points
module showPoints(points, r=0.1) {
  for (c = points) translate(c) sphere(r=r, $fn=8);
}

module poly3d(poly, convexity=1) {
  if (is_poly_vector(poly))
    for (p = poly) polyhedron(points=p[0],faces=p[1]);
  else
    polyhedron(points=poly[0],faces=poly[1], convexity=convexity);
}

module poly2d(poly) {
  if (is_poly_vector(poly))
    for (p = poly) polygon(points=p[0], paths=p[1]);
  else {
    if (depth(poly) == 2)
      polygon(poly);
    else
      polygon(points=poly[0], paths=poly[1]);
  }
}
